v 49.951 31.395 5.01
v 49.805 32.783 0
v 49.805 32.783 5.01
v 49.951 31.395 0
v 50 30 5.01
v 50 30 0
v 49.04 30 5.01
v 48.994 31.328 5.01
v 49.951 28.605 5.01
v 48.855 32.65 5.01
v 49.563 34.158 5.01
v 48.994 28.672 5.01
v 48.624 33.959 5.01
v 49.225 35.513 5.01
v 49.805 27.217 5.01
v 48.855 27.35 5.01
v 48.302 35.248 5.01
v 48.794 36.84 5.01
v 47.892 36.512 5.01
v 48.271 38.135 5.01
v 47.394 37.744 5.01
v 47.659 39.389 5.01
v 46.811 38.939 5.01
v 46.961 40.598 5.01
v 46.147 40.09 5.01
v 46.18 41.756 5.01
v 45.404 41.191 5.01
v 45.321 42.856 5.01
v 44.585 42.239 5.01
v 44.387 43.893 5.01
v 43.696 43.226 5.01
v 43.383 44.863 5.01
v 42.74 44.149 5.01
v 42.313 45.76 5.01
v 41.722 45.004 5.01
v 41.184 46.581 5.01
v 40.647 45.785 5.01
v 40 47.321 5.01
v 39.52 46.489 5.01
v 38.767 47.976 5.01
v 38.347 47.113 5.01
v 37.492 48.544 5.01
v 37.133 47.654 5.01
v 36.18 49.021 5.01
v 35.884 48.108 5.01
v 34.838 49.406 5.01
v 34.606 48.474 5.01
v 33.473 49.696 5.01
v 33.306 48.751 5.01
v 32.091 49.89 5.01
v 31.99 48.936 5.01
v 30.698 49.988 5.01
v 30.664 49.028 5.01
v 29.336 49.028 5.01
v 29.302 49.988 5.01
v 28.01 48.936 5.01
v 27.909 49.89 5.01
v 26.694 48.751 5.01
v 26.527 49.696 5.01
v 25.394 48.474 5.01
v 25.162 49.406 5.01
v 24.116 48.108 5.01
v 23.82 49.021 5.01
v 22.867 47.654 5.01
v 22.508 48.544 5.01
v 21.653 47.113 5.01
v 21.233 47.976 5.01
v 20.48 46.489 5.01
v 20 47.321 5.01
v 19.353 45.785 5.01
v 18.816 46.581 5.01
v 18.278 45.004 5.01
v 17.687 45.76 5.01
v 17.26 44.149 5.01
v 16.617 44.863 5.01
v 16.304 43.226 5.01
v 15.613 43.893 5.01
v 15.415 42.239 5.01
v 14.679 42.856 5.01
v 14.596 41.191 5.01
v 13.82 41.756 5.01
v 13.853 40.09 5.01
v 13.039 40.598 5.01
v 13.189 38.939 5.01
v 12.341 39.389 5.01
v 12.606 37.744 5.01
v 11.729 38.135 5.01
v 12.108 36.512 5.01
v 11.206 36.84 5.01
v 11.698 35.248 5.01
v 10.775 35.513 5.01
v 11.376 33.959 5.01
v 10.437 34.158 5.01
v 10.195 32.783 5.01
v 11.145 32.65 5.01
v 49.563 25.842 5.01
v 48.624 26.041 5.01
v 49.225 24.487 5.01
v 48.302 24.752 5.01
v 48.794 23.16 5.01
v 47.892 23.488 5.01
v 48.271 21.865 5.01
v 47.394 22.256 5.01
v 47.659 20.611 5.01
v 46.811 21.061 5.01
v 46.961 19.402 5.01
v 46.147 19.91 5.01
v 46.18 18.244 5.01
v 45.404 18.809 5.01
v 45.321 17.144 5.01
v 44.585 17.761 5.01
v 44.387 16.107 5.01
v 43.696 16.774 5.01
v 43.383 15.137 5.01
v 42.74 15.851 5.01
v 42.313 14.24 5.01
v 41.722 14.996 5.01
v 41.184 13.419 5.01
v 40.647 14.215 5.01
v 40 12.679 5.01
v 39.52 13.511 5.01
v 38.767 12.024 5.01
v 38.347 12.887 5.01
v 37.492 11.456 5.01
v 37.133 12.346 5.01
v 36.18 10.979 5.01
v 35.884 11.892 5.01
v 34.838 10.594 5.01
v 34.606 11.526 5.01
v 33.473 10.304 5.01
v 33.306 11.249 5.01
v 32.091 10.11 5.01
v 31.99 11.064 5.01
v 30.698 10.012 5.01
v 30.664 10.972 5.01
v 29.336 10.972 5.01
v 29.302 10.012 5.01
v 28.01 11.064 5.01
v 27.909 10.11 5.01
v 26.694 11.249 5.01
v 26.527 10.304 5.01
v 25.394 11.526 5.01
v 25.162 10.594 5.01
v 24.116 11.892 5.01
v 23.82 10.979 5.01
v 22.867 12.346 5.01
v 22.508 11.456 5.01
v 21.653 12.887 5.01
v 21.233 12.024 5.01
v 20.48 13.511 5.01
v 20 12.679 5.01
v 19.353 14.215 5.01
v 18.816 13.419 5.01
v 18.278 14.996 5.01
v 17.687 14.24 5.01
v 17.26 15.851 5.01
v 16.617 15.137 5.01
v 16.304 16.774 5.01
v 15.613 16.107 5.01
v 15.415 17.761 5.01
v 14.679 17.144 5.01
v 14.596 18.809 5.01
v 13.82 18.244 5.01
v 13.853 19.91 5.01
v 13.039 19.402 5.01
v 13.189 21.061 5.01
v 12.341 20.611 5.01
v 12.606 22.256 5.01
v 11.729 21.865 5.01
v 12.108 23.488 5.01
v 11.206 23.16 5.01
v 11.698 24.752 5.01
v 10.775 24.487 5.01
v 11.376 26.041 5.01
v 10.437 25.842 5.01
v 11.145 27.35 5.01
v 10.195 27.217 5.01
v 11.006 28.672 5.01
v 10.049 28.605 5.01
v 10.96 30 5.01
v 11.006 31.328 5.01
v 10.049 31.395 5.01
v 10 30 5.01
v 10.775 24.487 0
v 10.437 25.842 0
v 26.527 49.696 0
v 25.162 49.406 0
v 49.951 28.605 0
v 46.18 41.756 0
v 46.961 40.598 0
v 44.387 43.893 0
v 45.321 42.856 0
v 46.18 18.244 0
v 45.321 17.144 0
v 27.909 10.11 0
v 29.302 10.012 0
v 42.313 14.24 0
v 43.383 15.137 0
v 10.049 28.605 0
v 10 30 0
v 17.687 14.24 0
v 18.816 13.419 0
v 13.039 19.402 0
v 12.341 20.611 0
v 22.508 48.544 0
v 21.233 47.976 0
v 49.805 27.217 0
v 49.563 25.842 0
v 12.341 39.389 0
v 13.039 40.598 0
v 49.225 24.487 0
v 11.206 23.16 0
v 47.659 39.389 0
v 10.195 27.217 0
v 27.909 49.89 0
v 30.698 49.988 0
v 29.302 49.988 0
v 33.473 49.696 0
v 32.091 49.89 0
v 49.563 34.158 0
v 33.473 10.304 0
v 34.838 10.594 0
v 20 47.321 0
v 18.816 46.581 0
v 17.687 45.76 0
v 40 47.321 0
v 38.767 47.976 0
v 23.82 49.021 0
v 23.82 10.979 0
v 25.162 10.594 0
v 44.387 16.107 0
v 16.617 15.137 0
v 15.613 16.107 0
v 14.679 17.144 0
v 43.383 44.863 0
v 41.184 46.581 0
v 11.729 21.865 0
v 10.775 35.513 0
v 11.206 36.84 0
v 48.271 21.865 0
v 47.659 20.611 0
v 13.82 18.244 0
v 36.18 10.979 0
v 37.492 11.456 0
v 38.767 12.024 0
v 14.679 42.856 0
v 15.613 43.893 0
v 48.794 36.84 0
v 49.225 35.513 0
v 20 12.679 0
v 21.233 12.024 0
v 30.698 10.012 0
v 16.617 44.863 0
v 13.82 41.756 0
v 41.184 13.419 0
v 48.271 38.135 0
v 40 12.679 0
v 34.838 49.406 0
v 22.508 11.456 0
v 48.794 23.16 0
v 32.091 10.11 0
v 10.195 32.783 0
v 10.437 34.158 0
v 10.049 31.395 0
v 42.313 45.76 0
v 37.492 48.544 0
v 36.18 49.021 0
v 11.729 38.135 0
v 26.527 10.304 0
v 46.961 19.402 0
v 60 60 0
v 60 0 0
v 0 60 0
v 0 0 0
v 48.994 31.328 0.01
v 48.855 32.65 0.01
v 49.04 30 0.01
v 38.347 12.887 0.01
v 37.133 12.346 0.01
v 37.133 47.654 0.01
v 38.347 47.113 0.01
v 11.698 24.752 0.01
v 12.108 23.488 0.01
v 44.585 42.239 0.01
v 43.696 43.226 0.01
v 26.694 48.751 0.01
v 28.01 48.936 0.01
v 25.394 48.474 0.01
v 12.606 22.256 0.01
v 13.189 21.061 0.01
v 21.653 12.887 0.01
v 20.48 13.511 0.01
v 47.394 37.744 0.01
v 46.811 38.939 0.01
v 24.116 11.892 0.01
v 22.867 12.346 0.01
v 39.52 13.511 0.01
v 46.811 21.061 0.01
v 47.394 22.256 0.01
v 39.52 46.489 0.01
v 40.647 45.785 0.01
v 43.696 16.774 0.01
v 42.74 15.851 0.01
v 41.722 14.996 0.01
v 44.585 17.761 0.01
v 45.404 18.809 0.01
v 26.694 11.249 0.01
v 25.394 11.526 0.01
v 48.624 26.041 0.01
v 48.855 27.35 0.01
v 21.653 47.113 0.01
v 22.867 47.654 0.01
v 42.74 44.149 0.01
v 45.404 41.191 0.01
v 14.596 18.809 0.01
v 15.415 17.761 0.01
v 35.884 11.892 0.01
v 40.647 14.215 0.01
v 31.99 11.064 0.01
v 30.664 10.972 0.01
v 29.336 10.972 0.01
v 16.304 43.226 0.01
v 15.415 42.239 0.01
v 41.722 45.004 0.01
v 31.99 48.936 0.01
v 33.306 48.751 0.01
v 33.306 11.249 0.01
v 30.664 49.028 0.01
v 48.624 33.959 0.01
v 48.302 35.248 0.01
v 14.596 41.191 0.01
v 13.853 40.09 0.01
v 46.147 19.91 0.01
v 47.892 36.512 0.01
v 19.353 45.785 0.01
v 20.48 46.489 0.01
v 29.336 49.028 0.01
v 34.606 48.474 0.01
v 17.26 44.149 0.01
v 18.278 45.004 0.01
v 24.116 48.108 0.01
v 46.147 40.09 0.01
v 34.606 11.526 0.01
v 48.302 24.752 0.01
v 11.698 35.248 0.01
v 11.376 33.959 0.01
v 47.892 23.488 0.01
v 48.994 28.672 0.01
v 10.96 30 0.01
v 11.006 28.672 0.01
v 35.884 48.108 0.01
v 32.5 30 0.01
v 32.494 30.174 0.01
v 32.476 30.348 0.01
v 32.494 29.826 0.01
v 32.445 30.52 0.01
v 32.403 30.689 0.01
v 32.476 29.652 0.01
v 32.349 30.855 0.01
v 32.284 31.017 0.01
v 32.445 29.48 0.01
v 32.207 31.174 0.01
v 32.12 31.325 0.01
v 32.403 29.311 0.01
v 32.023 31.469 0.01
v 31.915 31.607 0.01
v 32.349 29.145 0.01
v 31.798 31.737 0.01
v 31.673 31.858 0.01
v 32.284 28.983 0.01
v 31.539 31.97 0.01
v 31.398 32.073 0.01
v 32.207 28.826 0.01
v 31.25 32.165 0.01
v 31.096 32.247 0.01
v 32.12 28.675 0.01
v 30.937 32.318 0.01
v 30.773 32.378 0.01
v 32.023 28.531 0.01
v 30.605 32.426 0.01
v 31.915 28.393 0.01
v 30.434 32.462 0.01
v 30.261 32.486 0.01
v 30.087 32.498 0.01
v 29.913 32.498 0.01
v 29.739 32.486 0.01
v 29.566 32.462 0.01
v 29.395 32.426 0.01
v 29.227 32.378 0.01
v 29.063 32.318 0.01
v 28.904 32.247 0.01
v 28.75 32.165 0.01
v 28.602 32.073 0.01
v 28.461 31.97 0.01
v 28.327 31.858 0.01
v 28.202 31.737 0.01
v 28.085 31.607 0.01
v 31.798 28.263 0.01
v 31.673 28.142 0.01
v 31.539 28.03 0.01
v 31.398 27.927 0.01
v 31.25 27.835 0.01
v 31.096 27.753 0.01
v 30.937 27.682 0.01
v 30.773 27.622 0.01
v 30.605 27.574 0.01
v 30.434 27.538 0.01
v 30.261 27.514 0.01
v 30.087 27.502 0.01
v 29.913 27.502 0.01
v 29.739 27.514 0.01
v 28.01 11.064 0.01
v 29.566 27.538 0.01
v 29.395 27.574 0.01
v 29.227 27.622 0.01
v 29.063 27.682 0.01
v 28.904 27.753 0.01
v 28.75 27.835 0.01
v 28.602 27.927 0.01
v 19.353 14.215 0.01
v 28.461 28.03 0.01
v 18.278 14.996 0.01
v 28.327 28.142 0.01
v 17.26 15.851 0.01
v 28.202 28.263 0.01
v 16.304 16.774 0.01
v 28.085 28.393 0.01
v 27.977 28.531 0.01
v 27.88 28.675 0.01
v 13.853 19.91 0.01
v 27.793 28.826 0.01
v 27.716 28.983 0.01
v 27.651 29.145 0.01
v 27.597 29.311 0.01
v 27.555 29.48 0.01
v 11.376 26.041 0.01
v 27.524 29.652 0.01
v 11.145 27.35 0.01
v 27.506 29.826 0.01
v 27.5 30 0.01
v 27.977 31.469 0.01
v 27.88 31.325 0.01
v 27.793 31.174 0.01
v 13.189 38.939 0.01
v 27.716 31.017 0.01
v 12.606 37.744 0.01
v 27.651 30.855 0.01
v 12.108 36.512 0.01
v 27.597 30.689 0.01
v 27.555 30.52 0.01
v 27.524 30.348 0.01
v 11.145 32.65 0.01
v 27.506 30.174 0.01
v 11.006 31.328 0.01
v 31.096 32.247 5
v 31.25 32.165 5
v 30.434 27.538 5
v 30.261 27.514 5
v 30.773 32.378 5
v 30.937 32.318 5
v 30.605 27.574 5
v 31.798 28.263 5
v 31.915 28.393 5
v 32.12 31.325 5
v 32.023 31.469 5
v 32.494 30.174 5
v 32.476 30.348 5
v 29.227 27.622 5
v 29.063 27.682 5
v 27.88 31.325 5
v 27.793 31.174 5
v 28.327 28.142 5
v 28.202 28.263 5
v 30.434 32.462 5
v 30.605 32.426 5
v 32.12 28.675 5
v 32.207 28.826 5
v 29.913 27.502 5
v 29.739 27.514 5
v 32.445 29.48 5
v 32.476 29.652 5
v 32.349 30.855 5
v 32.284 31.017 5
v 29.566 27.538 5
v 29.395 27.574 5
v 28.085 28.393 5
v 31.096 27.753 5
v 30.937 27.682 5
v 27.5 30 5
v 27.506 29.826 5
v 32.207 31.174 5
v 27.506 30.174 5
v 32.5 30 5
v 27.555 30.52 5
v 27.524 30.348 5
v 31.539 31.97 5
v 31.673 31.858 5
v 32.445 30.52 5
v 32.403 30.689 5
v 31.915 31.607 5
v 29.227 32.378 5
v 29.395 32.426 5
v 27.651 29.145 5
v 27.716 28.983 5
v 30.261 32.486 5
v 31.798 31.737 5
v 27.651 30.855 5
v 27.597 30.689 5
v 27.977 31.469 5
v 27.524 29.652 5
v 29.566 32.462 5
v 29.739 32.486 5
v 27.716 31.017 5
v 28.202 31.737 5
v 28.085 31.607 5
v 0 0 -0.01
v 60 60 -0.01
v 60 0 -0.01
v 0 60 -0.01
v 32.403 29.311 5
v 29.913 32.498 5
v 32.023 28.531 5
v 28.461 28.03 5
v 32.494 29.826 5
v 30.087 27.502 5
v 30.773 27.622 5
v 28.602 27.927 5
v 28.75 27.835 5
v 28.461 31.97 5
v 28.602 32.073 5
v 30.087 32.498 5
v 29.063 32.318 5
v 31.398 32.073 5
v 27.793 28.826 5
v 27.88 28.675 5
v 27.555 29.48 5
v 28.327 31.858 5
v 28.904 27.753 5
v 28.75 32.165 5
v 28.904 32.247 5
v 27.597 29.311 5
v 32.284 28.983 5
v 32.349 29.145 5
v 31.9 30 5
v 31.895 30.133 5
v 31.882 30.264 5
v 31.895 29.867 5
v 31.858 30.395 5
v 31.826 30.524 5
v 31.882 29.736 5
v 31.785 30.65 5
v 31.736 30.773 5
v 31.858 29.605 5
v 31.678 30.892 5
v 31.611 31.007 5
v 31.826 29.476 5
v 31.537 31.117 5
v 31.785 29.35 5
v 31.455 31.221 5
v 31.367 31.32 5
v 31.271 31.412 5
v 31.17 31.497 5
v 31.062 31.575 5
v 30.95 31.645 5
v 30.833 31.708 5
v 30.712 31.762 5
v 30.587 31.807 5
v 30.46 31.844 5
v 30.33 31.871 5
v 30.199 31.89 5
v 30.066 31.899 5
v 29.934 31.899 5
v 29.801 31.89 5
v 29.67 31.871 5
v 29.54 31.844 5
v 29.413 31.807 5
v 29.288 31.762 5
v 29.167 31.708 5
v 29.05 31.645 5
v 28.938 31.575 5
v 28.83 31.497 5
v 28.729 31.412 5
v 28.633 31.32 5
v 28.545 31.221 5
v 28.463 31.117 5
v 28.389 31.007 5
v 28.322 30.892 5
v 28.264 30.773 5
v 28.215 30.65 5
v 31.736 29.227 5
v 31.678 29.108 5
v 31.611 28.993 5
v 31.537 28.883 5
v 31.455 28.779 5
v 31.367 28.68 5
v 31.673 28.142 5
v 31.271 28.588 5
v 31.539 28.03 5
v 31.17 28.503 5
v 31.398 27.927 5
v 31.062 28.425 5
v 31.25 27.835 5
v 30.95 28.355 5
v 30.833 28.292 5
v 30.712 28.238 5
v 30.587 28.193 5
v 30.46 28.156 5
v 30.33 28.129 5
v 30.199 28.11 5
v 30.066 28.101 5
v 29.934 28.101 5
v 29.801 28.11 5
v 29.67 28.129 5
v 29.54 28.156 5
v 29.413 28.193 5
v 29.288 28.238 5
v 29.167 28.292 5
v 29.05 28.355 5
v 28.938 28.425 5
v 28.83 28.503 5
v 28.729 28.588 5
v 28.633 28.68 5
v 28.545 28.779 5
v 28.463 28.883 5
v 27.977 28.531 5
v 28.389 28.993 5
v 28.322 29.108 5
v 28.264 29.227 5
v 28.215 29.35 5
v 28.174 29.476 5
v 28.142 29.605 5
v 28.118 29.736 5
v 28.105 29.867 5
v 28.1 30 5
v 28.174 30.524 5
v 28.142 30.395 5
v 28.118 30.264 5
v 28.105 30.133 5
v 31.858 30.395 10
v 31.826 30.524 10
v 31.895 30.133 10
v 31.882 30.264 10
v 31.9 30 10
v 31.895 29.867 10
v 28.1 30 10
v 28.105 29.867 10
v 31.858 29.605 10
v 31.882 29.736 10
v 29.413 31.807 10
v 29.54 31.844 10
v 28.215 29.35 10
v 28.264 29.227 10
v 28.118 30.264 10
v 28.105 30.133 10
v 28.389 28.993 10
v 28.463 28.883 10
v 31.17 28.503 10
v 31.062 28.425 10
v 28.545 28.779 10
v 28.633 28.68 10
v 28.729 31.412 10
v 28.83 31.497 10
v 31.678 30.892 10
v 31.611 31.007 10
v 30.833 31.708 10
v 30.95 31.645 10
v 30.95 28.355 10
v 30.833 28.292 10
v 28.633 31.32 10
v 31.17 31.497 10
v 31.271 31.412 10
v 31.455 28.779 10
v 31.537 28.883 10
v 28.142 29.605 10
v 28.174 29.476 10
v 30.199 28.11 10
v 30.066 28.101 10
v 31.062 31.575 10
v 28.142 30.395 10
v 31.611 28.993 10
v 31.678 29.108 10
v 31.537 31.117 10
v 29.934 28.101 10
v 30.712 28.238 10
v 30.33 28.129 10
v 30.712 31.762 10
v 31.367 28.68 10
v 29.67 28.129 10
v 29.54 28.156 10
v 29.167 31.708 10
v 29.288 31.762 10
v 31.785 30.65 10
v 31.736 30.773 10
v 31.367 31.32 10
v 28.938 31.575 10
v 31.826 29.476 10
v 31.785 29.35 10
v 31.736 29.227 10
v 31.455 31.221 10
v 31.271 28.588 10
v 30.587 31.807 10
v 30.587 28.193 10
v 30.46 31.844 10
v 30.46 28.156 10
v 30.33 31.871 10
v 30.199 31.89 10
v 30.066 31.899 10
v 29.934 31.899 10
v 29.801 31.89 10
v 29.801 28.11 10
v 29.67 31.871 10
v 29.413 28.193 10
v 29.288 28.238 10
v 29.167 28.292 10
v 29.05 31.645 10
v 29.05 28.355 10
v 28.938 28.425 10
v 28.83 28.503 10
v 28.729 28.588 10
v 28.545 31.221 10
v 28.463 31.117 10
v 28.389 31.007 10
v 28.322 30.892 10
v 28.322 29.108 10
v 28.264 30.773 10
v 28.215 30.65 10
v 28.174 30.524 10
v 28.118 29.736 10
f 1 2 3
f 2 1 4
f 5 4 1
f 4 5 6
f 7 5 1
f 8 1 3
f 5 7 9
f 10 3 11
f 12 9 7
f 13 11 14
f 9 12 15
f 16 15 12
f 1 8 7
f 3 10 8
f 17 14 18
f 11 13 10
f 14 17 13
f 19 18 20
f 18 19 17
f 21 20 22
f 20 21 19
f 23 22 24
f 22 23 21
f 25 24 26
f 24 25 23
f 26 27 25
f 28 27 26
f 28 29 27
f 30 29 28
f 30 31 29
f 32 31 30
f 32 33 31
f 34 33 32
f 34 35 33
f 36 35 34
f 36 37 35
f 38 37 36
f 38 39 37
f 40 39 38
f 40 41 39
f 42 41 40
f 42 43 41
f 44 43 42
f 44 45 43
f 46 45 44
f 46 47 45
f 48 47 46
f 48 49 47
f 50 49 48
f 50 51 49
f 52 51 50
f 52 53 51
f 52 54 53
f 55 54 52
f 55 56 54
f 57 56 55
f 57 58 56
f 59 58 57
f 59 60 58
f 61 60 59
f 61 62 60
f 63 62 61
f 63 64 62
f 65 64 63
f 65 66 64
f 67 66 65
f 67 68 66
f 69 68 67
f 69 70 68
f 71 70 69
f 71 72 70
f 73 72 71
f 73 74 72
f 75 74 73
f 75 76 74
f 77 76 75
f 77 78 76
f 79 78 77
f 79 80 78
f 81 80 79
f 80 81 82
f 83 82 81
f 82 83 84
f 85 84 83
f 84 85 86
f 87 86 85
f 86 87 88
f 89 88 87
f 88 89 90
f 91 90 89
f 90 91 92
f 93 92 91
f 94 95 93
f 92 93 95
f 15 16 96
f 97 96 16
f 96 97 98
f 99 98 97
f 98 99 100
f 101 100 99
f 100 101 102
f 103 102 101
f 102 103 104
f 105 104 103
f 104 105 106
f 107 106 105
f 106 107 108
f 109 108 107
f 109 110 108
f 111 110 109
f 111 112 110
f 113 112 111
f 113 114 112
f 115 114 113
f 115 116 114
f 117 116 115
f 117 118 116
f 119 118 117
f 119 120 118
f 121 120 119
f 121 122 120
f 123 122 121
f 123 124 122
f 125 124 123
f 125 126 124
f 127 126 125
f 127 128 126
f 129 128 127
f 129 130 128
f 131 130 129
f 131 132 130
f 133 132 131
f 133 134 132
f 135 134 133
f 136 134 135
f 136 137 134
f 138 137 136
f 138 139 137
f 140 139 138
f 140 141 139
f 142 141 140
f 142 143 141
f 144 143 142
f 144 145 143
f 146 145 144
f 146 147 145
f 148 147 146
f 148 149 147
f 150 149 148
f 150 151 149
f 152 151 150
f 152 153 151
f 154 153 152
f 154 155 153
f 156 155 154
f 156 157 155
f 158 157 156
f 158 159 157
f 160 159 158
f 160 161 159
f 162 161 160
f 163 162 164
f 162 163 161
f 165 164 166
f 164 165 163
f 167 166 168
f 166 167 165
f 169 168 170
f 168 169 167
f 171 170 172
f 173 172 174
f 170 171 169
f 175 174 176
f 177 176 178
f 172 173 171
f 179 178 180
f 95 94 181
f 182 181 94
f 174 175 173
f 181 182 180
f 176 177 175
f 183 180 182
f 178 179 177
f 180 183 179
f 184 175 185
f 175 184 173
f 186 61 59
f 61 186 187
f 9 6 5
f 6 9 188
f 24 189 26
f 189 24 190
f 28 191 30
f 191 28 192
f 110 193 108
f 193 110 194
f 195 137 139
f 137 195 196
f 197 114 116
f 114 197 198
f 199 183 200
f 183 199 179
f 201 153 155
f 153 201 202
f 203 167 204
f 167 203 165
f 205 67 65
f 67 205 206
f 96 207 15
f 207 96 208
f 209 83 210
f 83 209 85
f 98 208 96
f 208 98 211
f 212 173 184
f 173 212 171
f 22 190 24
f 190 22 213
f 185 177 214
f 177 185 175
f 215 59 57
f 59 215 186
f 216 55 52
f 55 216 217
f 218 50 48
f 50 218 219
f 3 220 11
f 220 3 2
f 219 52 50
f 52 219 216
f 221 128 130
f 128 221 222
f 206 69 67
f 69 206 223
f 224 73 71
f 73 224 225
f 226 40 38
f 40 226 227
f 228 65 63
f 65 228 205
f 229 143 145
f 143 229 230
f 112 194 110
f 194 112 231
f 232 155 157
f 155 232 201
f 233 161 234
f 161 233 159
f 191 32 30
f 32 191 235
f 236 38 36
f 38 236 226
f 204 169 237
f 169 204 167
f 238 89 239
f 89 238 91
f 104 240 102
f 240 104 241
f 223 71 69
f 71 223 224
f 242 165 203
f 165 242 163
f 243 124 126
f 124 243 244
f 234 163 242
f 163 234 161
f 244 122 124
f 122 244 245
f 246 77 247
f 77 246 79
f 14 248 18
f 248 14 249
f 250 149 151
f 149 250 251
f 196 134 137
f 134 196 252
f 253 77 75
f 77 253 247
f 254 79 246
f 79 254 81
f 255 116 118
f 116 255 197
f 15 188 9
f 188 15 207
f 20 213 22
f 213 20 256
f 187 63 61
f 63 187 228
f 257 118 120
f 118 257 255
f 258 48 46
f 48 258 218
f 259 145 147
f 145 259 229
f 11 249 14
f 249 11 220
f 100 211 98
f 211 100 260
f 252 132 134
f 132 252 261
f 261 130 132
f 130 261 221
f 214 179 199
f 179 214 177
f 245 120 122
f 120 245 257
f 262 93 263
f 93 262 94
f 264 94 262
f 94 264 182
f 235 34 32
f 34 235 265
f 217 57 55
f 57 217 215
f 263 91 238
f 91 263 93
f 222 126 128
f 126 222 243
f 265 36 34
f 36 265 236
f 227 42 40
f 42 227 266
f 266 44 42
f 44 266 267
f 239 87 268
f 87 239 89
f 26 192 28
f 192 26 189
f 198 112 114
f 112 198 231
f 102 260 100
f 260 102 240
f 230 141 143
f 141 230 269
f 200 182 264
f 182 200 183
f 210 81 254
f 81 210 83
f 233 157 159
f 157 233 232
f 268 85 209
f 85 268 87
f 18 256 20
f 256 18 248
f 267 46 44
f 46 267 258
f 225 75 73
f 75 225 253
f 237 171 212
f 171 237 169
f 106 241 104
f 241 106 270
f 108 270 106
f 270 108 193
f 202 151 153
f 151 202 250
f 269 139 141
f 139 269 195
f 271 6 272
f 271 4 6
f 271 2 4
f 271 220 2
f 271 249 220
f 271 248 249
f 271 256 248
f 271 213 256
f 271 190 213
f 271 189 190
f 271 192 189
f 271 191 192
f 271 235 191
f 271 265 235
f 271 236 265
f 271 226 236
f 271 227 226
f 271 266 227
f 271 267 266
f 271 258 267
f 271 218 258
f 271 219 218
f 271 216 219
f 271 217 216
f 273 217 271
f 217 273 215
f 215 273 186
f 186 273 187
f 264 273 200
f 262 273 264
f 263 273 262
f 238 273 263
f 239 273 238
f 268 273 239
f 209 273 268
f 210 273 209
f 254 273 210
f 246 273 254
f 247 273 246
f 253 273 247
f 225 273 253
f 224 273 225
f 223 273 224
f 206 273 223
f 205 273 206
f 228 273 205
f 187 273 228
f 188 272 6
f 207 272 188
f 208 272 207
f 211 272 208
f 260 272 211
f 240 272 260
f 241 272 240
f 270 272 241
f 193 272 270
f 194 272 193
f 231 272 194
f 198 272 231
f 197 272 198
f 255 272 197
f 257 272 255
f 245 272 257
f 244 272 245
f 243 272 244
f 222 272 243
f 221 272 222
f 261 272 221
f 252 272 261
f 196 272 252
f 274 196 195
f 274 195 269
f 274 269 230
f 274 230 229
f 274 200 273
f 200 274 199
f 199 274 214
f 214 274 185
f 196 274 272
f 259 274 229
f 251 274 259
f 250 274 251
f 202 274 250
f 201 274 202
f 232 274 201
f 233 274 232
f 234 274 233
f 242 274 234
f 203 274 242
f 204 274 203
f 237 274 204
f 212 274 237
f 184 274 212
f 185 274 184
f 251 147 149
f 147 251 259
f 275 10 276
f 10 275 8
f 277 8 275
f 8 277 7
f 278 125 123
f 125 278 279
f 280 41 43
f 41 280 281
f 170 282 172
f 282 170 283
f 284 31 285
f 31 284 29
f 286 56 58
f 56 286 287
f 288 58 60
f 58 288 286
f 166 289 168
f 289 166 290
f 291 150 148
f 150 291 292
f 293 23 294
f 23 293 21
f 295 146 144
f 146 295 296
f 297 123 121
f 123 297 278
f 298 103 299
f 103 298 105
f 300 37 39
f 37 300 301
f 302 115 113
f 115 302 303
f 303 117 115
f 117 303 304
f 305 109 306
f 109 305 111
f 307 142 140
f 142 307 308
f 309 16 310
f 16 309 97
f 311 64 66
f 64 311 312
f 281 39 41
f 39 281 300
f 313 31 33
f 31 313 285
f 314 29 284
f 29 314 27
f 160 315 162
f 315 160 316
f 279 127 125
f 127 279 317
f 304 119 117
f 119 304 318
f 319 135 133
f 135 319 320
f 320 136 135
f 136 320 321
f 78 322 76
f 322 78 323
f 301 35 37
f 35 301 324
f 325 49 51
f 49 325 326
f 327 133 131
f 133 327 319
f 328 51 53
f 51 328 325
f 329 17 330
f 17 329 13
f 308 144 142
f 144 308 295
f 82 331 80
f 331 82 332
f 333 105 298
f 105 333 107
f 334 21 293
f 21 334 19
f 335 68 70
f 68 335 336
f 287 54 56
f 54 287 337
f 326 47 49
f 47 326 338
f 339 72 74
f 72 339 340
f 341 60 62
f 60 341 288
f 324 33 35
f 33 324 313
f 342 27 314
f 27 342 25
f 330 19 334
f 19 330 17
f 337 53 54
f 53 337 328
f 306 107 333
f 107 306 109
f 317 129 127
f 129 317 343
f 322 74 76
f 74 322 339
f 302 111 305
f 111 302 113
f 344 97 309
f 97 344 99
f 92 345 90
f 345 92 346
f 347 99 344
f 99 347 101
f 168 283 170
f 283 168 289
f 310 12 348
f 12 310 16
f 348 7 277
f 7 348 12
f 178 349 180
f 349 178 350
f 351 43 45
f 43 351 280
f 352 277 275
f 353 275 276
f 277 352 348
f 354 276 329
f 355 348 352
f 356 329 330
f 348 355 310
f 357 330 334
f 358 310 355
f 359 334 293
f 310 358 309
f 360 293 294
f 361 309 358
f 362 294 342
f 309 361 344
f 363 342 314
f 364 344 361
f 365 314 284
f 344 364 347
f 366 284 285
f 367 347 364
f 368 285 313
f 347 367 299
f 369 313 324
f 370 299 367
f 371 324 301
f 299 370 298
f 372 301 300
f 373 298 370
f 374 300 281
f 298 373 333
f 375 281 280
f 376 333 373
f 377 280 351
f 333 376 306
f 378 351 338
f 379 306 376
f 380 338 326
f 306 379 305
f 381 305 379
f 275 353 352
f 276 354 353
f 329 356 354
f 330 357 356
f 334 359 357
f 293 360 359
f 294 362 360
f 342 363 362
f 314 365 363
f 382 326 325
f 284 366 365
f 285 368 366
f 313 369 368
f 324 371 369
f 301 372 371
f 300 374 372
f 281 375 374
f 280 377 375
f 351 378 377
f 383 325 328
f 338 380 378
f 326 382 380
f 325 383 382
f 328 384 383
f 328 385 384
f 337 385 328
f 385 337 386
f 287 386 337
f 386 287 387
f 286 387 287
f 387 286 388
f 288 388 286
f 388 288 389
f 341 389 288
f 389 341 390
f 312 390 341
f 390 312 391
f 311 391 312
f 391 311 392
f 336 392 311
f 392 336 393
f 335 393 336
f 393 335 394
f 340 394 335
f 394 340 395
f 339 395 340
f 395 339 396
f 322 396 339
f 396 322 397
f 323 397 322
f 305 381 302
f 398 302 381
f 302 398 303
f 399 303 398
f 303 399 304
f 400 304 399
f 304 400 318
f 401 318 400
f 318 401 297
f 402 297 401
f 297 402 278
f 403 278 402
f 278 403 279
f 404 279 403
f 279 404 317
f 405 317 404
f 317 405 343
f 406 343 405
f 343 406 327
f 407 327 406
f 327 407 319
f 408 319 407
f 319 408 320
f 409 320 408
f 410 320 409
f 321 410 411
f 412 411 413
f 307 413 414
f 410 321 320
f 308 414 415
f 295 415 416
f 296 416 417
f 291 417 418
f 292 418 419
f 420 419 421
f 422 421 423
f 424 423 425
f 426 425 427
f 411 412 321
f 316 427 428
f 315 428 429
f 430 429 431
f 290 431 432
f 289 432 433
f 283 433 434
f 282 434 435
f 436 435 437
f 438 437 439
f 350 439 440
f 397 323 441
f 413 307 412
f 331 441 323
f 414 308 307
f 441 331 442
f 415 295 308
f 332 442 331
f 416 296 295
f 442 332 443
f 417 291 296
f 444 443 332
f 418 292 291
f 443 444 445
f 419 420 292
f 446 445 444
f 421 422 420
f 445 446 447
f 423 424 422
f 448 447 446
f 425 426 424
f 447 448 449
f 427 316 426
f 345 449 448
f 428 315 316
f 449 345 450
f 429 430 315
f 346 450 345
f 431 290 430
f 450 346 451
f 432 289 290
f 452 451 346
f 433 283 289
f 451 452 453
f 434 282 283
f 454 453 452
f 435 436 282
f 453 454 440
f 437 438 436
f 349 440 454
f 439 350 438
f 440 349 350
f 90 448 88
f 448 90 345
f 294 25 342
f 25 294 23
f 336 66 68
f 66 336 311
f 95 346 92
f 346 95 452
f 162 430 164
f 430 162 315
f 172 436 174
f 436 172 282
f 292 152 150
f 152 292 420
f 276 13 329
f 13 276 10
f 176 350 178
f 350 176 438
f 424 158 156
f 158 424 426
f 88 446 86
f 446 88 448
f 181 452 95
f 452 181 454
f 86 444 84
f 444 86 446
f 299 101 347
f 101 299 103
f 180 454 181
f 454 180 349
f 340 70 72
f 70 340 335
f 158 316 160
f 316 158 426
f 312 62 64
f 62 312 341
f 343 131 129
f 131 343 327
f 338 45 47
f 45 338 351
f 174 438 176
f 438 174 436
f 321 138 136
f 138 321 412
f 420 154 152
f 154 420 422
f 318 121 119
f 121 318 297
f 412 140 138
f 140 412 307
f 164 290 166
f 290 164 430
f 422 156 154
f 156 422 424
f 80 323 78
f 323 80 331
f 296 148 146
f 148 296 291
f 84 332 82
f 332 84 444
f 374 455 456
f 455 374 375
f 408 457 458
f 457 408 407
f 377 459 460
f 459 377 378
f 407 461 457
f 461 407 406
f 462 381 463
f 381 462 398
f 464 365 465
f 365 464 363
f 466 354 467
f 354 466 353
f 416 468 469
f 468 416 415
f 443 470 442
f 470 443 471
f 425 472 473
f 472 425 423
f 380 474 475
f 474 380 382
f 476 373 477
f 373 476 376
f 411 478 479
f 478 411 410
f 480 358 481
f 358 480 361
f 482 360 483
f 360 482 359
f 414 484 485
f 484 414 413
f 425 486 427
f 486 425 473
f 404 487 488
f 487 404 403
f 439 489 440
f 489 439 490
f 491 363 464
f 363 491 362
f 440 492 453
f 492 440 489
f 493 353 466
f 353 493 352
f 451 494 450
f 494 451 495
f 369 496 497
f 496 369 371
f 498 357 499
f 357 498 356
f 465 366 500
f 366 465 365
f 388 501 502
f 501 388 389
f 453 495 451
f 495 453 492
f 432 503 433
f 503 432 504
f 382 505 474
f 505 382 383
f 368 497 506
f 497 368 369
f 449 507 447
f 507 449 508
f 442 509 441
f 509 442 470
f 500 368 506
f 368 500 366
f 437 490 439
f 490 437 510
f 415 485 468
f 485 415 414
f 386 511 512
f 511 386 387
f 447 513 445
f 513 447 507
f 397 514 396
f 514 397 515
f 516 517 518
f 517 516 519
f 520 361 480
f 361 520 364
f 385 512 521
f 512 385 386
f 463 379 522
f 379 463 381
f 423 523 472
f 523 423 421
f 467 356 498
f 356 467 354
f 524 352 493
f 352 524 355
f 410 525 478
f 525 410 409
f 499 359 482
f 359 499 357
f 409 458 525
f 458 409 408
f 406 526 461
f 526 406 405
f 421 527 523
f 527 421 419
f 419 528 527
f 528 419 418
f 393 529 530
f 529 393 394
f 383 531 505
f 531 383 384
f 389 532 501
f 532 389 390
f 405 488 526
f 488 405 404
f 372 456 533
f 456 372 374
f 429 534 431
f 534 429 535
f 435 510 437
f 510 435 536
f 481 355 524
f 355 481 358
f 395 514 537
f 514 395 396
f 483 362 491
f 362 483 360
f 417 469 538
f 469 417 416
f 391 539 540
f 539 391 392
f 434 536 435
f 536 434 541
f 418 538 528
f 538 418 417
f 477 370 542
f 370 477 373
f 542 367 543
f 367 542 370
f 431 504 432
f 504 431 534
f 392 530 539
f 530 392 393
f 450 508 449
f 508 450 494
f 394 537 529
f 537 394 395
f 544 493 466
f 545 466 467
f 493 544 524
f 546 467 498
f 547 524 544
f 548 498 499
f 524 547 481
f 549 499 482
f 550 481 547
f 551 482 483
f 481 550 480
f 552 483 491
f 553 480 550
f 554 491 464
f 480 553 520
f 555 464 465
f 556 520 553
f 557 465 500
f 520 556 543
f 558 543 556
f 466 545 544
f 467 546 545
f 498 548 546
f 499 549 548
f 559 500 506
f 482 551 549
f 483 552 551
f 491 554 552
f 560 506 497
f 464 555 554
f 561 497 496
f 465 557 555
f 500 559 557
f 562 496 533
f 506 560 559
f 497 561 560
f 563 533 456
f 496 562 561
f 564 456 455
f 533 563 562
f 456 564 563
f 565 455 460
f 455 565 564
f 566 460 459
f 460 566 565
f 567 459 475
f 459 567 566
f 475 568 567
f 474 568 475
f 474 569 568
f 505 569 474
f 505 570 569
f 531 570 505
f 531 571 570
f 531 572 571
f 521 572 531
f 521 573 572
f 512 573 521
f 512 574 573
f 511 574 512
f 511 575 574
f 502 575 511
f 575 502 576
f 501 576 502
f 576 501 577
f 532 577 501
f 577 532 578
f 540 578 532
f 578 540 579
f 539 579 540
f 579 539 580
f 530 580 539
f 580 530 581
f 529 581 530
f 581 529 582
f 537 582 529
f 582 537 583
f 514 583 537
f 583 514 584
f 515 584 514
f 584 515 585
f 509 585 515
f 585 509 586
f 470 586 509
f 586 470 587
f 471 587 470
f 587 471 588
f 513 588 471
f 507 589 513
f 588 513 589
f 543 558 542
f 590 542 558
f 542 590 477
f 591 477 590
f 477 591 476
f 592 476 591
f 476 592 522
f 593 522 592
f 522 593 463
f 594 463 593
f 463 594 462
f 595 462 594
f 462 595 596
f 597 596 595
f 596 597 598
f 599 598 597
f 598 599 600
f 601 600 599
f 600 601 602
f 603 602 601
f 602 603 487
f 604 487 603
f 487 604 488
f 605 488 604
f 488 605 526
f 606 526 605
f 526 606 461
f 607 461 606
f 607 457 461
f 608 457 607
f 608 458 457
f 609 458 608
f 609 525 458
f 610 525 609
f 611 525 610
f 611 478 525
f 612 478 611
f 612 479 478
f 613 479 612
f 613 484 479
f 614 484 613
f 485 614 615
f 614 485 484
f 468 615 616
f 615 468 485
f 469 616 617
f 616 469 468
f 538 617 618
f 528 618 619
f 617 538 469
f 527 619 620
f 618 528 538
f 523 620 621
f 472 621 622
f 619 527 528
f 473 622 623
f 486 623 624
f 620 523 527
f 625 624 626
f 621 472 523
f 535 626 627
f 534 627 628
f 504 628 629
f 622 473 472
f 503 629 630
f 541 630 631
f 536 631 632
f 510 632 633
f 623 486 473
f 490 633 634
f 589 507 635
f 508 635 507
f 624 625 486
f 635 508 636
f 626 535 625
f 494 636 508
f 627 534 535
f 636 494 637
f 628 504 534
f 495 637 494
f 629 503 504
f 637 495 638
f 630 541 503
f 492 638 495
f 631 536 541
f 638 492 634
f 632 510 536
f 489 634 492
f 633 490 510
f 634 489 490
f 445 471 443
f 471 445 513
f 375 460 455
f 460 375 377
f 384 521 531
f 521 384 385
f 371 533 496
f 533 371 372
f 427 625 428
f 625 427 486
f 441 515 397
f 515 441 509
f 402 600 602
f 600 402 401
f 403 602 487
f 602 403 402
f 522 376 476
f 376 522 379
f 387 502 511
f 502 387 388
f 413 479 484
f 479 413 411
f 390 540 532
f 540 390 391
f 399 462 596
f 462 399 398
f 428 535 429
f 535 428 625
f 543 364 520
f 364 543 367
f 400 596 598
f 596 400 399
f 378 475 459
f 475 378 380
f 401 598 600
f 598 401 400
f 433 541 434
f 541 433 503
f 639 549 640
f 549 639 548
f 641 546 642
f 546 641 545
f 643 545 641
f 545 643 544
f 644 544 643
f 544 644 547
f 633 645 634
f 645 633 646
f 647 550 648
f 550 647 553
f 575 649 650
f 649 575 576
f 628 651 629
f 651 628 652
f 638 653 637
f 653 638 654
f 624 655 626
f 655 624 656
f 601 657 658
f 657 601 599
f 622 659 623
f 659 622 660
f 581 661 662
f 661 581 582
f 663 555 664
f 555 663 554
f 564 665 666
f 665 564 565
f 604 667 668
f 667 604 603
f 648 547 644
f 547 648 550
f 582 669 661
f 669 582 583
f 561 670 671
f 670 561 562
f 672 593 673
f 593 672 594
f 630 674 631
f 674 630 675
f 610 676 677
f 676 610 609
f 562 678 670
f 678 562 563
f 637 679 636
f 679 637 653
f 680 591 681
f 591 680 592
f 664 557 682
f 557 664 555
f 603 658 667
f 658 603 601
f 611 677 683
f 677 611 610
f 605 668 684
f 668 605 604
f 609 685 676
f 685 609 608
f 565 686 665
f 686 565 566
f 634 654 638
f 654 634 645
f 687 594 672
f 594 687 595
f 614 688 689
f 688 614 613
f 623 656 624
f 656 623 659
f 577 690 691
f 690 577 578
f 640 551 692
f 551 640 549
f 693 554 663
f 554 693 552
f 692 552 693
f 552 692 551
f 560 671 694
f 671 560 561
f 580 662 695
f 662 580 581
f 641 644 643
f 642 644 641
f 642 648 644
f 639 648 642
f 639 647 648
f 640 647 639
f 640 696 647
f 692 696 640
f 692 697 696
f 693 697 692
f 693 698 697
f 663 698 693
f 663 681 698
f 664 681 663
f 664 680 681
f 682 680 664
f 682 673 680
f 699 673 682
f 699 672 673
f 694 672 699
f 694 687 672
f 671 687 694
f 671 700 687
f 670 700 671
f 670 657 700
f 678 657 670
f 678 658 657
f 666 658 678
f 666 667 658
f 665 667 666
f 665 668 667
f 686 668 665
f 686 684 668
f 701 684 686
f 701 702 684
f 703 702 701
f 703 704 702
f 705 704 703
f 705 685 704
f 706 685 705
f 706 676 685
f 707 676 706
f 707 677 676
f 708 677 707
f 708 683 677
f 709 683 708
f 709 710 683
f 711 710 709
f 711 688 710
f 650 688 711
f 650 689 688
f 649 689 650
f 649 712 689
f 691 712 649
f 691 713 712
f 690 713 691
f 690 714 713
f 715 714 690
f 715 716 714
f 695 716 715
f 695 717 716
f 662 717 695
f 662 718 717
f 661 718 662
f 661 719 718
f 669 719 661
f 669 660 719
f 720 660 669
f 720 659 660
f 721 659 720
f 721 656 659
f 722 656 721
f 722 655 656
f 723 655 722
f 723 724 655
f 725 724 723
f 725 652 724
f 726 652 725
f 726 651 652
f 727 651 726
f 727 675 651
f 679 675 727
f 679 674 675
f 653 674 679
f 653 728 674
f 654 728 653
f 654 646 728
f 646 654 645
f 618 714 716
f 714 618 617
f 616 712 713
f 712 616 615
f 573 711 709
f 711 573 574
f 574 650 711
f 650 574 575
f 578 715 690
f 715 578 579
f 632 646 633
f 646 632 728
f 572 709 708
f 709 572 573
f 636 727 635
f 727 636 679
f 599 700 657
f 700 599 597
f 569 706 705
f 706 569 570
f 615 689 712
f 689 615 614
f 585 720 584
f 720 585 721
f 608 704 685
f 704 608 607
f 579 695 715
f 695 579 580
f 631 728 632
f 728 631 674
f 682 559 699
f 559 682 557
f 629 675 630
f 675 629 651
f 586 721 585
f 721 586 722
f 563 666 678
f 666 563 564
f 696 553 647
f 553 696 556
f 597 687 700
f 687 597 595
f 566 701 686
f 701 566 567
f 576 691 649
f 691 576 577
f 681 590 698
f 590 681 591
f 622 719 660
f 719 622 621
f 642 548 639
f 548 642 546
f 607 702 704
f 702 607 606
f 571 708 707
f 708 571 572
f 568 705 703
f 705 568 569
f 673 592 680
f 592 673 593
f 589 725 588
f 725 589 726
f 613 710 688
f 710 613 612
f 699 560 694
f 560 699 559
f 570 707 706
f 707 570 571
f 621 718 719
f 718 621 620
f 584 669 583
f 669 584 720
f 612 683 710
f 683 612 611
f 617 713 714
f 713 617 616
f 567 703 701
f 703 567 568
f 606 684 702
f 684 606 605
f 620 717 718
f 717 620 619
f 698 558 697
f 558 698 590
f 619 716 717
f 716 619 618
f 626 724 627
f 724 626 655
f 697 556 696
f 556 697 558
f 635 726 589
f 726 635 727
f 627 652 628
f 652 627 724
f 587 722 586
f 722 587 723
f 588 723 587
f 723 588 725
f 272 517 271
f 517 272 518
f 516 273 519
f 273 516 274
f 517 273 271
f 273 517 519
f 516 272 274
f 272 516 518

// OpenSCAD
// file: ../Base/PlacementOptions.scad
// Fischertechnik Box Foundation
// Placement Options

// Alignment
NoAlign = 0;
AlignLeft = 1;
AlignBottom = 2;
AlignCenter = 3;
AlignRight = 4;
AlignTop = 5;

// Element rotation degree steps
rotations = [0, -90, -180, -270];

// Rotation
NoRotation = 0;
Rotate0 = 0;
Rotate90 = 1;
Rotate180 = 2;
Rotate270 = 3;

// Docking (seen from above)
NoDock = -1;
DockLeft = 0;
DockTop = 1;
DockRight = 2;
DockCorner = 2;
DockBottom = 3;

// Web corners
LowerLeft = 0;
UpperLeft = 1;
UpperRight = 2;
LowerRight = 3;

// Web position relative to corner
LeftOfCorner = 0;
RightOfCorner = 1;
// file: ../Base/Boxes.scad
// Fischertechnik Box Foundation
// Pre-designed Boxes

use <Constants.scad>

include <PlacementOptions.scad>

box190Width = 190;
box190Depth = 130;
box130Width = 130;
box130Depth = 95;

// Values are from an original ec3 box
topBottomDifference = 1.5;
outerHeight = 40;
innerHeight = 38.2;
baseThickness = outerHeight - innerHeight;
stackExcess = 5.7;
radius = 3.5;
wallThickness = 1.5;
tolerance = 0.2;
stackOffset = innerHeight - stackExcess;

boxUsageHeight = stackOffset;
boxWallThickness = wallThickness;
boxBaseThickness = baseThickness;
boxWebWidth = 3.0;

// getBoxWallThickness()
// Gets the wall thickness of a Fischertechnik Box
function getBoxWallThickness() = boxWallThickness;

// getBoxUsageHeight()
// Gets the usable height of a Fischertechnik box
function getBoxUsageHeight() = boxUsageHeight;

// getBoxInnerHeight()
// Gets the inner height of a Fischertechnik box, including the stack excess
function getBoxInnerHeight() = innerHeight;

// getBoxBaseThickness()
// Gets the thickness of the Fischertechnik box base.
function getBoxBaseThickness() = boxBaseThickness;

// getBoxWebWidth()
// Gets the width of a box web
function getBoxWebWidth() = boxWebWidth;

// getBox190Space()
// Gets the usable inner space of a Box 190 as an x/y-list
function getBox190Space() = [
    box190Width - 2*getBoxWallThickness() - topBottomDifference, 
    box190Depth - 2*getBoxWallThickness() - topBottomDifference ];

// BoxBase(width, depth)
// Creates an empty stackable Fischertechnik compatible box
// width = Outer width of the box (190, 130, ...)
// depth = Outer depth of the box (130, 95, ...)

module BoxBase(width, depth, height=outerHeight) {    
    thinPlate = 0.01;

    innerHeight = height - baseThickness;    
    
    module BodyPlate(width, depth) {
        translate([radius, radius])
        hull() {
            w = width-2*radius;
            d = depth-2*radius;
            cube([w, d, thinPlate]);
            cylinder(thinPlate, r=radius, $fn=getFragments());
            translate([w, 0])
                cylinder(thinPlate, r=radius, $fn=getFragments());
            translate([w, d])
                cylinder(thinPlate, r=radius, $fn=getFragments());
            translate([0, d])
                cylinder(thinPlate, r=radius, $fn=getFragments());
        }
    }
    
    module Body(tolerance=tolerance) {
        hull() {
            // Bottom with tolerance to fit into the original boxes when stacked
            translate([-wallThickness+tolerance, -wallThickness+tolerance, -baseThickness])
                BodyPlate(width-topBottomDifference-2*tolerance, depth-topBottomDifference-2*tolerance);
            
            // Top
            translate([-wallThickness-topBottomDifference/2, -wallThickness-topBottomDifference/2, innerHeight-thinPlate])
                BodyPlate(width, depth);
         }
    }

    module Cutoff() {
        hull() {
            coWidth = width - 2*wallThickness;
            coDepth = depth - 2*wallThickness;
            
            // Bottom
            BodyPlate(coWidth-topBottomDifference, coDepth-topBottomDifference);

            // Top
            translate([-topBottomDifference/2, -topBottomDifference/2, innerHeight+thinPlate]) 
                BodyPlate(coWidth, coDepth);
        }
    }
    
    difference() {        
        Body();
        Cutoff();
        stackOffset = innerHeight - stackExcess;
        translate([0, 0, stackOffset + baseThickness])
            Body(tolerance=0);
    }
}

// Creates the Fischertechnik empty box 130x190 mm and places it at position 0,0
// 190x130 are the outer sizes, the inner space is slightly smaller. Use getBox190Space() to get the inner sizes.
// The box is positioned that the usable inner space is at the 0,0,0 position. The

module Box190() {
    BoxBase(box190Width, box190Depth);
}

// Gets the usable inner space of a Box 130 as an x/y-list
function getBox130Space() = [
    box130Width - 2*getBoxWallThickness() - topBottomDifference, 
    box130Depth - 2*getBoxWallThickness() - topBottomDifference ];

// Creates the Fischertechnik empty box 95x130 mm and places it at position 0,0
// 190x130 are the outer sizes, the inner space is slightly smaller. Use getBox190Space() to get the inner sizes.
// The box is positioned that the usable inner space is at the 0,0,0 position. The

module Box130() {
    BoxBase(box130Width, box130Depth);
}

// Creates a web at the specified box walls
// corner 0 = LowerLeft, 1 = UpperLeft, 2 = UpperRight, 3 = LowerRight
// side 0 = LeftOfCorner, 1 = RightOfCorner
// distance = Distance in mm from the corner
// boxSpace = inner width and depth of the box (default: Box 190)
// webWidth = length of the web (default is 3 mms)
// webThickness = thickness of the web (default is 1 mm)

module BoxWeb(corner, side, distance, boxSpace=getBox190Space(), webWidth=getBoxWebWidth(), webThickness=1.0) {
    sink = getBoxWallThickness()/2;

    width = (corner % 2 == 0) ? 
            (side == LeftOfCorner ? webWidth : webThickness) :
            (side == LeftOfCorner ? webThickness : webWidth);

    depth = (corner % 2 == 0) ? 
            (side == RightOfCorner ? webWidth : webThickness) :
            (side == RightOfCorner ? webThickness : webWidth);
    
    xDiff = corner == LowerLeft ? 
                (side == LeftOfCorner ? -sink : distance) :
            (corner == UpperLeft ?                
                (side == LeftOfCorner ? distance : -sink) :
            (corner == UpperRight ?
                (side == LeftOfCorner ? boxSpace.x-webWidth+sink : boxSpace.x-distance-webThickness) :
                (side == LeftOfCorner ? boxSpace.x-distance-webThickness: boxSpace.x-webWidth+sink)));

    yDiff = corner == LowerLeft ? 
                (side == RightOfCorner ? -sink : distance) :
            (corner == UpperLeft ?
                (side == RightOfCorner ? boxSpace.y-distance : boxSpace.y-webWidth+sink) :
            (corner == UpperRight ?
                (side == RightOfCorner ? boxSpace.y-webWidth+sink : boxSpace.y-distance) :
                (side == RightOfCorner ? distance : -sink)));
    
    translate([xDiff, yDiff, -getExcess()])
        cube([width, depth, boxUsageHeight + 2*getExcess()]);
}
// file: ../Base/Rotation.scad
// Fischertechnik Box Foundation
// Geometry Helpers Rotation

include <PlacementOptions.scad>

// getRotatedSpace(space, rotation=NoRotation)
// Rotates the space dependent on the specified rotation

function getRotatedSpace(space, rotation=NoRotation) = [
    (rotation == Rotate90 || rotation == Rotate270) ? space.y : space.x,
    (rotation == Rotate90 || rotation == Rotate270) ? space.x : space.y
];

// Rotates the given space around the fixed left lower corner
// space = the space the children needs as width/depth list [width,depth]
// rotation = 0 Rotate0 degrees, 1 Rotate90 degrees, 2 Rotate180 degrees, 3 Rotate270 degrees (equivalent to -90)

module RotateFix(space, rotation=NoRotation) {
    dy = (rotation == Rotate0 || rotation == Rotate270) ? 0 :
        (rotation == Rotate90) ? space.x :
        space.y;
    dx = (rotation < Rotate180) ? 0 :
        (rotation == Rotate180) ? space.x :
        space.y;
    
    translate([dx, dy, 0])
        rotate([0, 0, rotations[rotation]])
            children();
}
// file: ../Base/Alignment.scad
// Fischertechnik Box Foundation
// Geometry Helpers Alignment

include <PlacementOptions.scad>

// getAlignedX(elementWidth, spaceWidth, align=AlignRight, offset=0)
// Gets the aligned X offset of an element with the given
// width in the given space.
// elementWidth = The width of the element to positon
// spaceWidth = The space where the element should be aligned
// align = 0 AlignLeft, 1 AlignCenter, 2 AlignRight
// offset = an optional offset from the aligned position. When
// aligned left or centered, then positive values are in X direction.
// When aligned right then positive values are in negative X direction.

function getAlignedX(elementWidth, spaceWidth, align=AlignRight, offset=0) =
    (align == AlignLeft) ?
        offset :
        ((align == AlignCenter) ?
        (spaceWidth - elementWidth)/2 + offset :
        spaceWidth - offset - elementWidth);

// getAlignedY(elementDepth, spaceDepth, align=AlignTop, offset=0)
// Gets the aligned Y offset of an element with the given
// depth in the given space.
// elementDepth = The depth of the element to positon
// spaceDepth = The space where the element should be aligned
// align = 0 AlignBottom, 1 AlignCenter, 2 AlignTop
// offset = an optional offset from the aligned position. When
// aligned bottom or centered, then positive values are in Y direction.
// When aligned top then positive values are in negative Y direction.

function getAlignedY(elementDepth, spaceDepth, align=AlignTop, offset=0) =
    (align == AlignBottom) ?
        offset :
        ((align == AlignCenter) ?
        (spaceDepth - elementDepth)/2 + offset :
        spaceDepth - offset - elementDepth);
// file: ../Base/Placement.scad
// Fischertechnik Box Foundation
// Geometry Helpers Placement

use <Constants.scad>
use <Alignment.scad>
use <Rotation.scad>
use <Boxes.scad>

include <PlacementOptions.scad>

// Place(x=0, y=0, elementSpace=[0,0], alignX=AlignLeft, alignY=AlignBottom, rotation=Rotate0, boxSpace=getBox190Space())
// Places the child at the specified position
// y = Y-Position. This is a relative position when an X aligment is specified.
// x = X-Position. This is a relative position when an Y aligment is specified.
// elementSpace = space of the element to be placed [x,y]
// alignX = -1=NoAlign, 0 AlignLeft, 1 AlignCenter, 3 AlignRight (elementSpace and boxSpace required!)
// alignY = -1=NoAlign, 2 AlignBottom, 1 AlignCenter, 4 AlignTop (elementSpace and boxSpace required!)
// rotation = 0 Rotate0 0 degrees, 1 Rotate90 90 degrees, 
// 2 Rotate180 180 degrees, 3 Rotate270 270 degrees (equivalent to -90)
// boxSpace = Inner space of the box where the placement occurs [x,y] - default is Box 190x130 inner space

module Place(x=0, y=0, elementSpace=[0,0], 
  alignX=AlignLeft, alignY=AlignBottom, 
  rotation=NoRotation, boxSpace=getBox190Space()) {

    module Position(x, y, space, rotation=Rotate0) {
        translate([x, y, 0])
            RotateFix(space, rotation)
                children();
    }

    space = getRotatedSpace(elementSpace, rotation);
    alignedX = getAlignedX(space.x, boxSpace.x, alignX, x);
    alignedY = getAlignedY(space.y, boxSpace.y, alignY, y);
    Position(alignedX, alignedY, elementSpace, rotation)
        children();
}

// Center(space=getBox130Space(), elementSpace=[0,0])
// space = Space where the children is centered. For cylinder use centered=true and no elementSpace.
// elementSpace = space of the element to be centered [x,y]

module Center(space=getBox190Space(), elementSpace=[0,0]) {
    Place(elementSpace=elementSpace, boxSpace=space, alignX=AlignCenter, alignY=AlignCenter)
        children();
}

// CenterHorizontal(width=0, y=0, offset=0, space=getBox130Space())
// width = Width of the element to be placed.
// y = Y position of the element
// offset = Offset from the center position (negative will be left of the center)
// space = Space where the element is placed

module CenterHorizontal(width=0, y=0, offset=0, space=getBox190Space()) {
    Place(x=offset, y=y, elementSpace=[width, 0], boxSpace=space, alignX=AlignCenter)
        children(0);
}

// CenterVertical(depth=0, x=0, offset=0, space=getBox130Space())
// depth = Depth of the element to be placed.
// x = X position of the element
// offset = Offset from the center position (negative will be down of the center)
// space = Space where the element is placed

module CenterVertical(depth=0, x=0, offset=0, space=getBox190Space()) {
    Place(x=x, y=offset, elementSpace=[0, depth], boxSpace=space, alignY=AlignCenter)
        children(0);
}

// getIsVertical(align)
// True if the specified alignment needs a vertical orientation for a divider (AlignRight, AlignLeft)

function getIsVertical(align) = (align == AlignRight || align == AlignLeft);

// getIsHorizontal(align)
// True if the specified alignment needs a horizontal orientation for a divider (AlignTop, AlignBottom)

function getIsHorizontal(align) = (align == AlignTop || align == AlignBottom);
// file: ../Base/Constants.scad
// Fischertechnik Box Foundation
// Constants

// Constant values necessary for multiple elements

// Base constants
dividerThickness = 1.2;
excess = 0.01;
fragments = 90;
tolerance = 0.8;

// Gets the thickness of a divider 
function getDividerThickness() = dividerThickness;

// Gets the excess that is used to merge walls into each other
function getExcess() = excess;

// Gets amount of fragments of a cylinder
function getFragments() = fragments;

// Gets the inner tolerance of a frame to each side
function getTolerance() = tolerance;


// Fischertechnik specific constants
axisDiameter = 4;
axisBottomDiameter = axisDiameter + 1;
axisTolerance = 0.2;

// Gets axis diameter of Fischertechnik axis
function getAxisDiameter() = axisDiameter;

// Gets axis diameter tolerance (subtracted for element axis)
function getAxisTolerance() = axisTolerance;

// Gets the axis diameter for standing axis
function getStandAxisDiameter() = getAxisDiameter() - getAxisTolerance();

// Gets axis bottom diameter for thicker part at the bottom
function getAxisBottomDiameter() = axisBottomDiameter;

standardEdgeDistance = 2.5;
standardWebDistance = 11.5;
standardCornerLength = 15;

// gets the standard distance to the wall of the box for dockable frames with webs
function getStandardEdgeDistance() = standardEdgeDistance;

// gets the standard distance of each web to the corner of the dockable frame
function getStandardWebDistance() = standardWebDistance;

// gets the standard length of the corner walls of a dockable frame
function getStandardCornerLength() = standardCornerLength;

tubeWallFactor = 0.8;

// gets the wall thickness of a tube.
function getTubeWallThickness() = tubeWallFactor * getDividerThickness();

smallPartsFrameHeight = 20;

// gets the frame height for docked small parts boxes.
function getSmallPartsFrameHeight() = smallPartsFrameHeight;

hubRingDiameter = 19.5;
hubRingLevelDiameter = 21;

// gets the diameter of a tube matching the inner ring of a wheel
function getHubRingDiameter() = hubRingDiameter;

// gets the diameter of a hub tube with a thicker diameter
function getHubRingLevelDiameter() = hubRingLevelDiameter;
// main file
// Fischertechnik Box Library
// Axis and cylinder for large pulley wheel with flat hub
// 31019, 31015

use <../Base/Constants.scad>
use <../Base/Placement.scad>
use <../ModelBase/Simple.scad>

/* [Element Parameters] */
height = 10;

/* [Hidden] */
width = 60;
depth = 60;
wheelThickness = 5;

// getComboFlatHubLargePulleyWheelSpace
// Gets the space the cylinder for the large pulley wheel needs.

function getComboFlatHubLargePulleyWheelSpace() = [width, depth, height];

// ComboFlatHubLargePulleyWheel
// Two cylinders for the large pulley wheel
// height = Height of the axis (the ring will be 5 mm lower)

module ComboFlatHubLargePulleyWheel(height=height) {
    Space(getComboFlatHubLargePulleyWheelSpace());

    ringDiameter = 40;
    levelHeight = height - wheelThickness;

    Center(getComboFlatHubLargePulleyWheelSpace()) {
        Tube(levelHeight, outerDiameter=ringDiameter);
        LeveledAxis(height, levelHeight);
    }
}

// Test
color("lightgray")
ComboFlatHubLargePulleyWheel(height);
